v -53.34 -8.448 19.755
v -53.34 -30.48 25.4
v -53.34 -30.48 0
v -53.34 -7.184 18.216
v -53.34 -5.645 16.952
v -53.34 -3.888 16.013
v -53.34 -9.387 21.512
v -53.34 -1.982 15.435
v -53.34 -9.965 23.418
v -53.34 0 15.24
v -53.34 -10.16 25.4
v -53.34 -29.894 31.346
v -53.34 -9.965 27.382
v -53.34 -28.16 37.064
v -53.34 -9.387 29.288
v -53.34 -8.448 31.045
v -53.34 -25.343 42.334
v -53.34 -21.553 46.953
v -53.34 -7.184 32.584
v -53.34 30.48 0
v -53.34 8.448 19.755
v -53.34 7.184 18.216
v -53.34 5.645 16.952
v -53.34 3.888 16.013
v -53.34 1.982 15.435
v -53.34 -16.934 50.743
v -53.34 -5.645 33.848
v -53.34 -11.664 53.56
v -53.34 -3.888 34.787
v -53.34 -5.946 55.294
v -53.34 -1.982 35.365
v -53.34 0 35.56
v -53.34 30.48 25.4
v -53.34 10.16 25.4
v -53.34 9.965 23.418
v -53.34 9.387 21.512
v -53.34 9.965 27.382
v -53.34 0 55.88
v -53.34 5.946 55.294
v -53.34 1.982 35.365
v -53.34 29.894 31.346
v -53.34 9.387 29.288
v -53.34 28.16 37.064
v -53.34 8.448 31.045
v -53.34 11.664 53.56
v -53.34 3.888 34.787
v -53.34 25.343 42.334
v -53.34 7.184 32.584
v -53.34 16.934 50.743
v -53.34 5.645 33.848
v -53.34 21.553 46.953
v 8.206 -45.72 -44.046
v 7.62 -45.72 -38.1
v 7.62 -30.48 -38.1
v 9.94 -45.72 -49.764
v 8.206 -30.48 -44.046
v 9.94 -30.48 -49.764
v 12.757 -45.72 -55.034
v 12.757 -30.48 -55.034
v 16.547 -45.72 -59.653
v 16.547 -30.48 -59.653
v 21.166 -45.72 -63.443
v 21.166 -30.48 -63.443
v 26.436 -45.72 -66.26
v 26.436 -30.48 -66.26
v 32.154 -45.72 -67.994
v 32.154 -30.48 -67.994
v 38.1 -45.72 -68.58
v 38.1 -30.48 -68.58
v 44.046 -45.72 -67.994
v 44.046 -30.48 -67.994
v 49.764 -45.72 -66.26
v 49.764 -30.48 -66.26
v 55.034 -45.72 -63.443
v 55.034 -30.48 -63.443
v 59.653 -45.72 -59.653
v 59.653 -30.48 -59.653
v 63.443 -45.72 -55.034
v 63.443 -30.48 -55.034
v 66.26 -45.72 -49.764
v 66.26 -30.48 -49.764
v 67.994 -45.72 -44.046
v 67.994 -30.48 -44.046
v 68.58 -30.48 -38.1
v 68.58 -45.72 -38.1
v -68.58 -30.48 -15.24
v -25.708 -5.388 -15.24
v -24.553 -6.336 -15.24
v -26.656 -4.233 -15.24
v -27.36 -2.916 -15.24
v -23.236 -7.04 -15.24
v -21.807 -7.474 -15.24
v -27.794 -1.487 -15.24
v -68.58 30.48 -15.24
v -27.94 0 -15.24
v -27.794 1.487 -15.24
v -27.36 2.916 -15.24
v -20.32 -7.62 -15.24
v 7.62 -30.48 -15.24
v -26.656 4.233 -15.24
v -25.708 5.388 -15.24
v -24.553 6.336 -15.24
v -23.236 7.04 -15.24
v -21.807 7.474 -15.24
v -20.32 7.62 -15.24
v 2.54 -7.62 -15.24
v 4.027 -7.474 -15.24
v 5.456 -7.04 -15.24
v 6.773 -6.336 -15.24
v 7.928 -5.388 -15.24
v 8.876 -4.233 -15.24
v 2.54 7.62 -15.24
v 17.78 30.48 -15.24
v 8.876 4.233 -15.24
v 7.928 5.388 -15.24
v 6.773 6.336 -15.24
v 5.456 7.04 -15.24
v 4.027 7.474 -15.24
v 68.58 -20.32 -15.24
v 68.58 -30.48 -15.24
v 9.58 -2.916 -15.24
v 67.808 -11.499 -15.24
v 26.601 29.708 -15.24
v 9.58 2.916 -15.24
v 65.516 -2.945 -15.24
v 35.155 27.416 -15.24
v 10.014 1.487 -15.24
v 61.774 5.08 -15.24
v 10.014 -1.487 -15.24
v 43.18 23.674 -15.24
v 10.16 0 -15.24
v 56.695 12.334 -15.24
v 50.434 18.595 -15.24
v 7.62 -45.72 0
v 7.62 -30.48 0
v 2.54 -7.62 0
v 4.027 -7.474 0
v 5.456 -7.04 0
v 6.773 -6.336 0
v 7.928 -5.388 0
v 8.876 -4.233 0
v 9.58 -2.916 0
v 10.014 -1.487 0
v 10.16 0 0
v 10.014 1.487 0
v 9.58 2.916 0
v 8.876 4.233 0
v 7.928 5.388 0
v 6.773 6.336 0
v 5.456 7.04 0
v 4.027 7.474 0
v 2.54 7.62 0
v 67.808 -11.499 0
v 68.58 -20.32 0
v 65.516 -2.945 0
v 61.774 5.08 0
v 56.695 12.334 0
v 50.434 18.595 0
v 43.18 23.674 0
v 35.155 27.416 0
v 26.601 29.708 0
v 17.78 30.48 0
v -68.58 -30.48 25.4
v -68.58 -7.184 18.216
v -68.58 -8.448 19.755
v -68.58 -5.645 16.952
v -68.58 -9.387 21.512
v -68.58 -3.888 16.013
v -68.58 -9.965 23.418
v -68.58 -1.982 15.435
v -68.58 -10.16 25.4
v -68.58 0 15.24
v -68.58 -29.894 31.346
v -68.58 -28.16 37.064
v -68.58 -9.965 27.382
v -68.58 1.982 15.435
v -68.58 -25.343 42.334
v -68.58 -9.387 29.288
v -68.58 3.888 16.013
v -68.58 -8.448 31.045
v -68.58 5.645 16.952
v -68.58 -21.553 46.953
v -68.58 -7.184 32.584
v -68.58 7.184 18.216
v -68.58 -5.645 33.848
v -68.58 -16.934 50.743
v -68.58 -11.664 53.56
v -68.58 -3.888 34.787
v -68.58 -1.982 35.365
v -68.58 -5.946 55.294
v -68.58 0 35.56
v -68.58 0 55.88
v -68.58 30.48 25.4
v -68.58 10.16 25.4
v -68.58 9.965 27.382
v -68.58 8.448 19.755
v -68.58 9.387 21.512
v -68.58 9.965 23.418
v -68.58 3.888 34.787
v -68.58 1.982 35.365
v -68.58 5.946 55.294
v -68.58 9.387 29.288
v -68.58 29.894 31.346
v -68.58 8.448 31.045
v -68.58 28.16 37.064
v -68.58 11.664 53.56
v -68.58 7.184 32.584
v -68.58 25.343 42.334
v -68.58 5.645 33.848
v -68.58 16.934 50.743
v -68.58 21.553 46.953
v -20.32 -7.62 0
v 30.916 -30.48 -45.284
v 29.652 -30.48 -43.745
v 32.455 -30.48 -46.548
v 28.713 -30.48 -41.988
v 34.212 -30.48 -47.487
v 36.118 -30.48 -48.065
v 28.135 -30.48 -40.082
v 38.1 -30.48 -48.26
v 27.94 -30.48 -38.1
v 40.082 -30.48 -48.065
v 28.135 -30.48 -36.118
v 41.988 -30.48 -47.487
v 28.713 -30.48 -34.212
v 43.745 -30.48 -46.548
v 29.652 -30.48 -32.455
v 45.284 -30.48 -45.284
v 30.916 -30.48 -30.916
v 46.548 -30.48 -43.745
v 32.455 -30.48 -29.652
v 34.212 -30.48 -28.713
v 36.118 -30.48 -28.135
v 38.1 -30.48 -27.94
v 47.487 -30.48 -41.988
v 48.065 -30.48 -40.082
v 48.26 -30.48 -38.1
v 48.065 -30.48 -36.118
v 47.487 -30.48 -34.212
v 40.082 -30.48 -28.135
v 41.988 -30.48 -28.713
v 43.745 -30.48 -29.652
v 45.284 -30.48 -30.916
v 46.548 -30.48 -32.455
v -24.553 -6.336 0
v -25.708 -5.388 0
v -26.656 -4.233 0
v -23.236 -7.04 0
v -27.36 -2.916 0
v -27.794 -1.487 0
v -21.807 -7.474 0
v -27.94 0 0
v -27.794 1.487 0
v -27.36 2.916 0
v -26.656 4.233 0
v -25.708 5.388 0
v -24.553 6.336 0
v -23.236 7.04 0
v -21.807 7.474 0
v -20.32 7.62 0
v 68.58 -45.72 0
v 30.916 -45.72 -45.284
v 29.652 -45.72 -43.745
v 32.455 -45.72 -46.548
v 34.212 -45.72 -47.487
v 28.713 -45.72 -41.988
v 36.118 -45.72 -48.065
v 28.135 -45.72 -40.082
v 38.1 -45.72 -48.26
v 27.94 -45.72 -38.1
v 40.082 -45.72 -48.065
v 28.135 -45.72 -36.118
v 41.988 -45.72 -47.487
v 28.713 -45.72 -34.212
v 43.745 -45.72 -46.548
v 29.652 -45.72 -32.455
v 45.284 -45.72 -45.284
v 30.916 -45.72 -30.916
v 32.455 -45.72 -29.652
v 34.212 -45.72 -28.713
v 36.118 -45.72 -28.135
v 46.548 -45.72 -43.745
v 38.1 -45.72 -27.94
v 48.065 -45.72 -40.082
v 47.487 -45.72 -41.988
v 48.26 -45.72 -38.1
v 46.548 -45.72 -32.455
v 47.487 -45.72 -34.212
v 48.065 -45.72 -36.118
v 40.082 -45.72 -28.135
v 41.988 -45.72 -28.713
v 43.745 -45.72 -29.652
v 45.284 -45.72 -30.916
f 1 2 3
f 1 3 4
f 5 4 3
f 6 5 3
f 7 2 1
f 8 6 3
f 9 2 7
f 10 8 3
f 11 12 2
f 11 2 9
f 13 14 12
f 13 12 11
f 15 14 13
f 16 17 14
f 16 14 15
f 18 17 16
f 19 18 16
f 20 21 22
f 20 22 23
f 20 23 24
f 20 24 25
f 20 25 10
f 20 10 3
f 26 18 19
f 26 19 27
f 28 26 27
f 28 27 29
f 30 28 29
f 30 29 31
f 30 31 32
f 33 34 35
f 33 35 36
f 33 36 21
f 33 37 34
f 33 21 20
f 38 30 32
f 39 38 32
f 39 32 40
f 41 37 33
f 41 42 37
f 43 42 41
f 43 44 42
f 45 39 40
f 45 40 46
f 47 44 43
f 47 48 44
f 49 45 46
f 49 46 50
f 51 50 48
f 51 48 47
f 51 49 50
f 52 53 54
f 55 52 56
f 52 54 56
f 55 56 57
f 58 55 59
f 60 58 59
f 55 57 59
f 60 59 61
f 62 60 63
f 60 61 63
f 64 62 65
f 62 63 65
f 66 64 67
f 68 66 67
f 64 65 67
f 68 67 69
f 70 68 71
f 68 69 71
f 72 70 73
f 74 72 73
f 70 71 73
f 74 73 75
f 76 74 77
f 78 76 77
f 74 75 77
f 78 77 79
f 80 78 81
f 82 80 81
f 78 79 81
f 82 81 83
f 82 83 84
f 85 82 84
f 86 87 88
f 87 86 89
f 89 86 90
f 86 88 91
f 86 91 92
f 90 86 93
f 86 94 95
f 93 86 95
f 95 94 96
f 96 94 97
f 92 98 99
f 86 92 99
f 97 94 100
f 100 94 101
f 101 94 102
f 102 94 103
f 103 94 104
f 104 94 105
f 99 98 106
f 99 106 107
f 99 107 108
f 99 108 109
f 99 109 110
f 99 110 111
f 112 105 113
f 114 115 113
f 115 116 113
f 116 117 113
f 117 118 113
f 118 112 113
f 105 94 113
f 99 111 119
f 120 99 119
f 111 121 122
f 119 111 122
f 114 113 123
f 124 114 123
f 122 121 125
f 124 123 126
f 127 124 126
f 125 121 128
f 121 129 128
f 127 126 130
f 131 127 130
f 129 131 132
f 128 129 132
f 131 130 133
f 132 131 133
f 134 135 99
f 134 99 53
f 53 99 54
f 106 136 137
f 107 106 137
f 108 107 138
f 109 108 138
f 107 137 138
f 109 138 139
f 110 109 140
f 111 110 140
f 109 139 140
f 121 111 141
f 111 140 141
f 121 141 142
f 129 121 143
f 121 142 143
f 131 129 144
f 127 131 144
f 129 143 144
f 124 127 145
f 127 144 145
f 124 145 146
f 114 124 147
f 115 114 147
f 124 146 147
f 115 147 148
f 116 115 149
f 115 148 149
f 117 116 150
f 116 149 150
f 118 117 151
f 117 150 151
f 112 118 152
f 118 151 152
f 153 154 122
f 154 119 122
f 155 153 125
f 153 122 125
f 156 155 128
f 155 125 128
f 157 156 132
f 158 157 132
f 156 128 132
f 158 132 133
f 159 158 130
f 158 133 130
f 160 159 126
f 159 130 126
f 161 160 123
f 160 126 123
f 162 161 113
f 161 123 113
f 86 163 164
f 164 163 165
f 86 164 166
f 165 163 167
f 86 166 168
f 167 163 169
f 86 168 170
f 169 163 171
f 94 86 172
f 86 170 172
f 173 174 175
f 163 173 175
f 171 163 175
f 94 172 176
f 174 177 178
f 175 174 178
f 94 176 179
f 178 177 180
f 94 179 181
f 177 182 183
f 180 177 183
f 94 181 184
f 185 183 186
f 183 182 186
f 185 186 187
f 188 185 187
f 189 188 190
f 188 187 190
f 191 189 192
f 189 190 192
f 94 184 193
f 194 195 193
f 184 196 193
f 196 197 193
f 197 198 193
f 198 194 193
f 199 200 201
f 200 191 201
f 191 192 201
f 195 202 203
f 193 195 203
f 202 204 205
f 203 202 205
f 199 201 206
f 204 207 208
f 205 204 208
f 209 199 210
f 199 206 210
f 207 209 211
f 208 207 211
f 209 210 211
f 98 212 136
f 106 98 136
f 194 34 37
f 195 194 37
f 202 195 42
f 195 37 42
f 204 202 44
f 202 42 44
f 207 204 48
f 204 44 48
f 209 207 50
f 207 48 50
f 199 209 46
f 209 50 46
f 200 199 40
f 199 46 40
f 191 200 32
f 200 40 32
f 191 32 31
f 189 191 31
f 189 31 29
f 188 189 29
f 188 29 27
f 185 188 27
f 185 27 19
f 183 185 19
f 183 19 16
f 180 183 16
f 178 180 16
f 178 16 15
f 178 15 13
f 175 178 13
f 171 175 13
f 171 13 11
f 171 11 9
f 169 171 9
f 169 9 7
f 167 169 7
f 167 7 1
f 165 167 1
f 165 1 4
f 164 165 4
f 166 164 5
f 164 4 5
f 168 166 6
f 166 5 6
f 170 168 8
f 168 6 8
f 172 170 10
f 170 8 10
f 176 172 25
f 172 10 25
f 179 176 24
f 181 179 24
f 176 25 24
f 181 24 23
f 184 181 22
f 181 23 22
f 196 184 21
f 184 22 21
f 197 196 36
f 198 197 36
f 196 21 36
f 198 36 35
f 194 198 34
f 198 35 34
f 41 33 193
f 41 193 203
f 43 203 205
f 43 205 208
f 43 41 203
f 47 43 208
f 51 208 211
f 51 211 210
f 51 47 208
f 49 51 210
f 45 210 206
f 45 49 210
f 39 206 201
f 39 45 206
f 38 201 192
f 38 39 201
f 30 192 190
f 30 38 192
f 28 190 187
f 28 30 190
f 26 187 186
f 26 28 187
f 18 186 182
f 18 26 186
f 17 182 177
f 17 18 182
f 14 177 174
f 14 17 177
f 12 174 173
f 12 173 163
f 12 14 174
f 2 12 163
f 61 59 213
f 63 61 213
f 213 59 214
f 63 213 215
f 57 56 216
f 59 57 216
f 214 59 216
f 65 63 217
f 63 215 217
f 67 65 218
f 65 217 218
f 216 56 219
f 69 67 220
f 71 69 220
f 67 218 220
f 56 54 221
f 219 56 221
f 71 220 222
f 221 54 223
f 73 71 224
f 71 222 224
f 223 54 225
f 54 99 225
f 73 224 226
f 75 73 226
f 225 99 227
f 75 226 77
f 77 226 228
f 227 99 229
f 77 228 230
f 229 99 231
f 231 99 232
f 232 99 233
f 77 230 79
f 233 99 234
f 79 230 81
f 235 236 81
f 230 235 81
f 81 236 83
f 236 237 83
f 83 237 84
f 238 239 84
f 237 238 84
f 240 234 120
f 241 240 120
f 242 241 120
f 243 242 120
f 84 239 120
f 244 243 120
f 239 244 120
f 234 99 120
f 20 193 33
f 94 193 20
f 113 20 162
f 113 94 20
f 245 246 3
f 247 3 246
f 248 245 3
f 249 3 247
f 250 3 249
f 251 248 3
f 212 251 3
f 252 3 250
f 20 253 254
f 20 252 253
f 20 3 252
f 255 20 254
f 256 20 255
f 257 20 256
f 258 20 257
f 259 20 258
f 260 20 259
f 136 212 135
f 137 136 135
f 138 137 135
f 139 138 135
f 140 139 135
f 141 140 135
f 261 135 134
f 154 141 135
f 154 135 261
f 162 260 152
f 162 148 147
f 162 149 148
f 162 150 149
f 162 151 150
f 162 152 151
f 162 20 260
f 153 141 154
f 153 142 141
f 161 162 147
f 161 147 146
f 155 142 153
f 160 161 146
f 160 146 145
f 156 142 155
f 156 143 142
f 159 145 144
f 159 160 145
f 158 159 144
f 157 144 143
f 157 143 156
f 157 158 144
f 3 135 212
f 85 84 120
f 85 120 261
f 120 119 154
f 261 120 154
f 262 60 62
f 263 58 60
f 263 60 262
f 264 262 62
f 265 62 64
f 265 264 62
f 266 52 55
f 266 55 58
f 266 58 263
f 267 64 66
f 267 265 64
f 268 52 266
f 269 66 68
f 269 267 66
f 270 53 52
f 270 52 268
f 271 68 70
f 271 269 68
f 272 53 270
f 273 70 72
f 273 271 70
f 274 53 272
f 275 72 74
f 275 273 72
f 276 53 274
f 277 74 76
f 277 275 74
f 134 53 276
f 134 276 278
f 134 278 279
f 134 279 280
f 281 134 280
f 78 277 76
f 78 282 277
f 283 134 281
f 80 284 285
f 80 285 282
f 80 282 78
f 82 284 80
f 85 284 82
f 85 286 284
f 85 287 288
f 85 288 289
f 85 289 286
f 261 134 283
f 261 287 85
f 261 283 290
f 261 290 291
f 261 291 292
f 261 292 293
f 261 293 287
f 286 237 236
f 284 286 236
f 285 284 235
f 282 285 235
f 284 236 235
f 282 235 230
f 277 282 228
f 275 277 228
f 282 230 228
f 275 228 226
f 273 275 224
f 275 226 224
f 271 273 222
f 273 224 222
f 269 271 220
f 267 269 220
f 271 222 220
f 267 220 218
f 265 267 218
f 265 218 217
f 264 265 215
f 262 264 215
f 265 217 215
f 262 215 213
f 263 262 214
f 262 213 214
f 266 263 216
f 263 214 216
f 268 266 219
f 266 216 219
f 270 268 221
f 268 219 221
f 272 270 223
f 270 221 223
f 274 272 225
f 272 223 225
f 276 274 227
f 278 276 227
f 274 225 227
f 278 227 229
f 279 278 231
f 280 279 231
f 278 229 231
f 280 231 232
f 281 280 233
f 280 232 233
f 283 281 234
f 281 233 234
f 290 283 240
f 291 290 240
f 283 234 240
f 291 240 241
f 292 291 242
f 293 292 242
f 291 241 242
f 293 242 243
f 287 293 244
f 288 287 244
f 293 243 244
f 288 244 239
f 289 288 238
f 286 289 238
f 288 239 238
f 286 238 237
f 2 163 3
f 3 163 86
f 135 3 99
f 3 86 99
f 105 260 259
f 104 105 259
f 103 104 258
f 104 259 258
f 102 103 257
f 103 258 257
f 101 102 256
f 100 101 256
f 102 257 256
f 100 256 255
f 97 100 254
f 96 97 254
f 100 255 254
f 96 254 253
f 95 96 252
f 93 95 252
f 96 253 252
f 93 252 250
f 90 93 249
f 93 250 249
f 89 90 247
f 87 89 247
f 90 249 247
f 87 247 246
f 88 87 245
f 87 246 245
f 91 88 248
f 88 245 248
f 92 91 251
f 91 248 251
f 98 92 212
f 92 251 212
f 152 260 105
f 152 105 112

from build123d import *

# Parameters (mm, degrees)
F0_W      = 121.92
F0_H      = 60.96
F0_W_2    = 15.24
F1_DEPTH  = 15.24
F2_DEPTH  = 25.4
F4_DEPTH  = 15.24
F5_DEPTH  = 15.241
F6_W      = 60.96
F6_H      = 15.24
F7_DEPTH  = 15.24
F8_R      = 50.8
F9_W      = 22.86
F9_H      = 15.24
F10_DEPTH = 68.581


with BuildPart() as f1:
    # F0 (on Top) → F1 (new body)
    with BuildSketch(Plane.XY):
        with Locations((7.62, 0)):
            Rectangle(F0_W, F0_H)
        with Locations((-60.96, 0)):
            Rectangle(F0_W_2, F0_H)
    extrude(amount=-F1_DEPTH)

    # F0 (on Top) → F2 (join)
    with BuildSketch(Plane.XY):
        with Locations((-60.96, 0)):
            Rectangle(F0_W_2, F0_H)
    extrude(amount=F2_DEPTH)

    # F3 (on face) → F4 (join)
    with BuildSketch(Plane.YZ.offset(-53.34)):
        with BuildLine():
            Line((10.16, 25.4), (30.48, 25.4))
            ThreePointArc((30.48, 25.4), (0, 55.88), (-30.48, 25.4))
            Line((-30.48, 25.4), (-10.16, 25.4))
            ThreePointArc((-10.16, 25.4), (0, 35.56), (10.16, 25.4))
        make_face()
    extrude(amount=-F4_DEPTH)

    # F3 (on face) → F5 (cut, through all)
    with BuildSketch(Plane.YZ.offset(-53.34)):
        with BuildLine():
            ThreePointArc((-10.16, 25.4), (0, 15.24), (10.16, 25.4))
            Line((10.16, 25.4), (-10.16, 25.4))
        make_face()
        with BuildLine():
            Line((-10.16, 25.4), (10.16, 25.4))
            ThreePointArc((10.16, 25.4), (0, 35.56), (-10.16, 25.4))
        make_face()
    extrude(amount=-F5_DEPTH, mode=Mode.SUBTRACT)

    # F6 (on face) → F7 (join)
    with BuildSketch(Plane.XZ.offset(30.48)):
        with Locations((38.1, -7.62)):
            Rectangle(F6_W, F6_H)
        with BuildLine():
            Line((68.58, -38.1), (68.58, -15.24))
            Line((68.58, -15.24), (7.62, -15.24))
            Line((7.62, -15.24), (7.62, -38.1))
            Line((7.62, -38.1), (27.94, -38.1))
            ThreePointArc((27.94, -38.1), (38.1, -27.94), (48.26, -38.1))
            Line((48.26, -38.1), (68.58, -38.1))
        make_face()
        with BuildLine():
            ThreePointArc((7.62, -38.1), (38.1, -68.58), (68.58, -38.1))
            Line((68.58, -38.1), (48.26, -38.1))
            ThreePointArc((48.26, -38.1), (38.1, -48.26), (27.94, -38.1))
            Line((27.94, -38.1), (7.62, -38.1))
        make_face()
    extrude(amount=F7_DEPTH)

    # F8
    f8_edges = [f1.edges().sort_by_distance(p)[0] for p in [
        (68.58, 30.48, -7.62),
    ]]
    fillet(f8_edges, radius=F8_R)

    # F9 (on face) → F10 (cut, through all)
    with BuildSketch(Plane.XY):
        with Locations((-8.89, 0)):
            Rectangle(F9_W, F9_H)
        with BuildLine():
            Line((2.54, 7.62), (2.54, -7.62))
            ThreePointArc((2.54, -7.62), (10.16, 0), (2.54, 7.62))
        make_face()
        with BuildLine():
            ThreePointArc((-20.32, 7.62), (-27.94, 0), (-20.32, -7.62))
            Line((-20.32, -7.62), (-20.32, 7.62))
        make_face()
    extrude(amount=-F10_DEPTH, mode=Mode.SUBTRACT)


solid = f1.part
